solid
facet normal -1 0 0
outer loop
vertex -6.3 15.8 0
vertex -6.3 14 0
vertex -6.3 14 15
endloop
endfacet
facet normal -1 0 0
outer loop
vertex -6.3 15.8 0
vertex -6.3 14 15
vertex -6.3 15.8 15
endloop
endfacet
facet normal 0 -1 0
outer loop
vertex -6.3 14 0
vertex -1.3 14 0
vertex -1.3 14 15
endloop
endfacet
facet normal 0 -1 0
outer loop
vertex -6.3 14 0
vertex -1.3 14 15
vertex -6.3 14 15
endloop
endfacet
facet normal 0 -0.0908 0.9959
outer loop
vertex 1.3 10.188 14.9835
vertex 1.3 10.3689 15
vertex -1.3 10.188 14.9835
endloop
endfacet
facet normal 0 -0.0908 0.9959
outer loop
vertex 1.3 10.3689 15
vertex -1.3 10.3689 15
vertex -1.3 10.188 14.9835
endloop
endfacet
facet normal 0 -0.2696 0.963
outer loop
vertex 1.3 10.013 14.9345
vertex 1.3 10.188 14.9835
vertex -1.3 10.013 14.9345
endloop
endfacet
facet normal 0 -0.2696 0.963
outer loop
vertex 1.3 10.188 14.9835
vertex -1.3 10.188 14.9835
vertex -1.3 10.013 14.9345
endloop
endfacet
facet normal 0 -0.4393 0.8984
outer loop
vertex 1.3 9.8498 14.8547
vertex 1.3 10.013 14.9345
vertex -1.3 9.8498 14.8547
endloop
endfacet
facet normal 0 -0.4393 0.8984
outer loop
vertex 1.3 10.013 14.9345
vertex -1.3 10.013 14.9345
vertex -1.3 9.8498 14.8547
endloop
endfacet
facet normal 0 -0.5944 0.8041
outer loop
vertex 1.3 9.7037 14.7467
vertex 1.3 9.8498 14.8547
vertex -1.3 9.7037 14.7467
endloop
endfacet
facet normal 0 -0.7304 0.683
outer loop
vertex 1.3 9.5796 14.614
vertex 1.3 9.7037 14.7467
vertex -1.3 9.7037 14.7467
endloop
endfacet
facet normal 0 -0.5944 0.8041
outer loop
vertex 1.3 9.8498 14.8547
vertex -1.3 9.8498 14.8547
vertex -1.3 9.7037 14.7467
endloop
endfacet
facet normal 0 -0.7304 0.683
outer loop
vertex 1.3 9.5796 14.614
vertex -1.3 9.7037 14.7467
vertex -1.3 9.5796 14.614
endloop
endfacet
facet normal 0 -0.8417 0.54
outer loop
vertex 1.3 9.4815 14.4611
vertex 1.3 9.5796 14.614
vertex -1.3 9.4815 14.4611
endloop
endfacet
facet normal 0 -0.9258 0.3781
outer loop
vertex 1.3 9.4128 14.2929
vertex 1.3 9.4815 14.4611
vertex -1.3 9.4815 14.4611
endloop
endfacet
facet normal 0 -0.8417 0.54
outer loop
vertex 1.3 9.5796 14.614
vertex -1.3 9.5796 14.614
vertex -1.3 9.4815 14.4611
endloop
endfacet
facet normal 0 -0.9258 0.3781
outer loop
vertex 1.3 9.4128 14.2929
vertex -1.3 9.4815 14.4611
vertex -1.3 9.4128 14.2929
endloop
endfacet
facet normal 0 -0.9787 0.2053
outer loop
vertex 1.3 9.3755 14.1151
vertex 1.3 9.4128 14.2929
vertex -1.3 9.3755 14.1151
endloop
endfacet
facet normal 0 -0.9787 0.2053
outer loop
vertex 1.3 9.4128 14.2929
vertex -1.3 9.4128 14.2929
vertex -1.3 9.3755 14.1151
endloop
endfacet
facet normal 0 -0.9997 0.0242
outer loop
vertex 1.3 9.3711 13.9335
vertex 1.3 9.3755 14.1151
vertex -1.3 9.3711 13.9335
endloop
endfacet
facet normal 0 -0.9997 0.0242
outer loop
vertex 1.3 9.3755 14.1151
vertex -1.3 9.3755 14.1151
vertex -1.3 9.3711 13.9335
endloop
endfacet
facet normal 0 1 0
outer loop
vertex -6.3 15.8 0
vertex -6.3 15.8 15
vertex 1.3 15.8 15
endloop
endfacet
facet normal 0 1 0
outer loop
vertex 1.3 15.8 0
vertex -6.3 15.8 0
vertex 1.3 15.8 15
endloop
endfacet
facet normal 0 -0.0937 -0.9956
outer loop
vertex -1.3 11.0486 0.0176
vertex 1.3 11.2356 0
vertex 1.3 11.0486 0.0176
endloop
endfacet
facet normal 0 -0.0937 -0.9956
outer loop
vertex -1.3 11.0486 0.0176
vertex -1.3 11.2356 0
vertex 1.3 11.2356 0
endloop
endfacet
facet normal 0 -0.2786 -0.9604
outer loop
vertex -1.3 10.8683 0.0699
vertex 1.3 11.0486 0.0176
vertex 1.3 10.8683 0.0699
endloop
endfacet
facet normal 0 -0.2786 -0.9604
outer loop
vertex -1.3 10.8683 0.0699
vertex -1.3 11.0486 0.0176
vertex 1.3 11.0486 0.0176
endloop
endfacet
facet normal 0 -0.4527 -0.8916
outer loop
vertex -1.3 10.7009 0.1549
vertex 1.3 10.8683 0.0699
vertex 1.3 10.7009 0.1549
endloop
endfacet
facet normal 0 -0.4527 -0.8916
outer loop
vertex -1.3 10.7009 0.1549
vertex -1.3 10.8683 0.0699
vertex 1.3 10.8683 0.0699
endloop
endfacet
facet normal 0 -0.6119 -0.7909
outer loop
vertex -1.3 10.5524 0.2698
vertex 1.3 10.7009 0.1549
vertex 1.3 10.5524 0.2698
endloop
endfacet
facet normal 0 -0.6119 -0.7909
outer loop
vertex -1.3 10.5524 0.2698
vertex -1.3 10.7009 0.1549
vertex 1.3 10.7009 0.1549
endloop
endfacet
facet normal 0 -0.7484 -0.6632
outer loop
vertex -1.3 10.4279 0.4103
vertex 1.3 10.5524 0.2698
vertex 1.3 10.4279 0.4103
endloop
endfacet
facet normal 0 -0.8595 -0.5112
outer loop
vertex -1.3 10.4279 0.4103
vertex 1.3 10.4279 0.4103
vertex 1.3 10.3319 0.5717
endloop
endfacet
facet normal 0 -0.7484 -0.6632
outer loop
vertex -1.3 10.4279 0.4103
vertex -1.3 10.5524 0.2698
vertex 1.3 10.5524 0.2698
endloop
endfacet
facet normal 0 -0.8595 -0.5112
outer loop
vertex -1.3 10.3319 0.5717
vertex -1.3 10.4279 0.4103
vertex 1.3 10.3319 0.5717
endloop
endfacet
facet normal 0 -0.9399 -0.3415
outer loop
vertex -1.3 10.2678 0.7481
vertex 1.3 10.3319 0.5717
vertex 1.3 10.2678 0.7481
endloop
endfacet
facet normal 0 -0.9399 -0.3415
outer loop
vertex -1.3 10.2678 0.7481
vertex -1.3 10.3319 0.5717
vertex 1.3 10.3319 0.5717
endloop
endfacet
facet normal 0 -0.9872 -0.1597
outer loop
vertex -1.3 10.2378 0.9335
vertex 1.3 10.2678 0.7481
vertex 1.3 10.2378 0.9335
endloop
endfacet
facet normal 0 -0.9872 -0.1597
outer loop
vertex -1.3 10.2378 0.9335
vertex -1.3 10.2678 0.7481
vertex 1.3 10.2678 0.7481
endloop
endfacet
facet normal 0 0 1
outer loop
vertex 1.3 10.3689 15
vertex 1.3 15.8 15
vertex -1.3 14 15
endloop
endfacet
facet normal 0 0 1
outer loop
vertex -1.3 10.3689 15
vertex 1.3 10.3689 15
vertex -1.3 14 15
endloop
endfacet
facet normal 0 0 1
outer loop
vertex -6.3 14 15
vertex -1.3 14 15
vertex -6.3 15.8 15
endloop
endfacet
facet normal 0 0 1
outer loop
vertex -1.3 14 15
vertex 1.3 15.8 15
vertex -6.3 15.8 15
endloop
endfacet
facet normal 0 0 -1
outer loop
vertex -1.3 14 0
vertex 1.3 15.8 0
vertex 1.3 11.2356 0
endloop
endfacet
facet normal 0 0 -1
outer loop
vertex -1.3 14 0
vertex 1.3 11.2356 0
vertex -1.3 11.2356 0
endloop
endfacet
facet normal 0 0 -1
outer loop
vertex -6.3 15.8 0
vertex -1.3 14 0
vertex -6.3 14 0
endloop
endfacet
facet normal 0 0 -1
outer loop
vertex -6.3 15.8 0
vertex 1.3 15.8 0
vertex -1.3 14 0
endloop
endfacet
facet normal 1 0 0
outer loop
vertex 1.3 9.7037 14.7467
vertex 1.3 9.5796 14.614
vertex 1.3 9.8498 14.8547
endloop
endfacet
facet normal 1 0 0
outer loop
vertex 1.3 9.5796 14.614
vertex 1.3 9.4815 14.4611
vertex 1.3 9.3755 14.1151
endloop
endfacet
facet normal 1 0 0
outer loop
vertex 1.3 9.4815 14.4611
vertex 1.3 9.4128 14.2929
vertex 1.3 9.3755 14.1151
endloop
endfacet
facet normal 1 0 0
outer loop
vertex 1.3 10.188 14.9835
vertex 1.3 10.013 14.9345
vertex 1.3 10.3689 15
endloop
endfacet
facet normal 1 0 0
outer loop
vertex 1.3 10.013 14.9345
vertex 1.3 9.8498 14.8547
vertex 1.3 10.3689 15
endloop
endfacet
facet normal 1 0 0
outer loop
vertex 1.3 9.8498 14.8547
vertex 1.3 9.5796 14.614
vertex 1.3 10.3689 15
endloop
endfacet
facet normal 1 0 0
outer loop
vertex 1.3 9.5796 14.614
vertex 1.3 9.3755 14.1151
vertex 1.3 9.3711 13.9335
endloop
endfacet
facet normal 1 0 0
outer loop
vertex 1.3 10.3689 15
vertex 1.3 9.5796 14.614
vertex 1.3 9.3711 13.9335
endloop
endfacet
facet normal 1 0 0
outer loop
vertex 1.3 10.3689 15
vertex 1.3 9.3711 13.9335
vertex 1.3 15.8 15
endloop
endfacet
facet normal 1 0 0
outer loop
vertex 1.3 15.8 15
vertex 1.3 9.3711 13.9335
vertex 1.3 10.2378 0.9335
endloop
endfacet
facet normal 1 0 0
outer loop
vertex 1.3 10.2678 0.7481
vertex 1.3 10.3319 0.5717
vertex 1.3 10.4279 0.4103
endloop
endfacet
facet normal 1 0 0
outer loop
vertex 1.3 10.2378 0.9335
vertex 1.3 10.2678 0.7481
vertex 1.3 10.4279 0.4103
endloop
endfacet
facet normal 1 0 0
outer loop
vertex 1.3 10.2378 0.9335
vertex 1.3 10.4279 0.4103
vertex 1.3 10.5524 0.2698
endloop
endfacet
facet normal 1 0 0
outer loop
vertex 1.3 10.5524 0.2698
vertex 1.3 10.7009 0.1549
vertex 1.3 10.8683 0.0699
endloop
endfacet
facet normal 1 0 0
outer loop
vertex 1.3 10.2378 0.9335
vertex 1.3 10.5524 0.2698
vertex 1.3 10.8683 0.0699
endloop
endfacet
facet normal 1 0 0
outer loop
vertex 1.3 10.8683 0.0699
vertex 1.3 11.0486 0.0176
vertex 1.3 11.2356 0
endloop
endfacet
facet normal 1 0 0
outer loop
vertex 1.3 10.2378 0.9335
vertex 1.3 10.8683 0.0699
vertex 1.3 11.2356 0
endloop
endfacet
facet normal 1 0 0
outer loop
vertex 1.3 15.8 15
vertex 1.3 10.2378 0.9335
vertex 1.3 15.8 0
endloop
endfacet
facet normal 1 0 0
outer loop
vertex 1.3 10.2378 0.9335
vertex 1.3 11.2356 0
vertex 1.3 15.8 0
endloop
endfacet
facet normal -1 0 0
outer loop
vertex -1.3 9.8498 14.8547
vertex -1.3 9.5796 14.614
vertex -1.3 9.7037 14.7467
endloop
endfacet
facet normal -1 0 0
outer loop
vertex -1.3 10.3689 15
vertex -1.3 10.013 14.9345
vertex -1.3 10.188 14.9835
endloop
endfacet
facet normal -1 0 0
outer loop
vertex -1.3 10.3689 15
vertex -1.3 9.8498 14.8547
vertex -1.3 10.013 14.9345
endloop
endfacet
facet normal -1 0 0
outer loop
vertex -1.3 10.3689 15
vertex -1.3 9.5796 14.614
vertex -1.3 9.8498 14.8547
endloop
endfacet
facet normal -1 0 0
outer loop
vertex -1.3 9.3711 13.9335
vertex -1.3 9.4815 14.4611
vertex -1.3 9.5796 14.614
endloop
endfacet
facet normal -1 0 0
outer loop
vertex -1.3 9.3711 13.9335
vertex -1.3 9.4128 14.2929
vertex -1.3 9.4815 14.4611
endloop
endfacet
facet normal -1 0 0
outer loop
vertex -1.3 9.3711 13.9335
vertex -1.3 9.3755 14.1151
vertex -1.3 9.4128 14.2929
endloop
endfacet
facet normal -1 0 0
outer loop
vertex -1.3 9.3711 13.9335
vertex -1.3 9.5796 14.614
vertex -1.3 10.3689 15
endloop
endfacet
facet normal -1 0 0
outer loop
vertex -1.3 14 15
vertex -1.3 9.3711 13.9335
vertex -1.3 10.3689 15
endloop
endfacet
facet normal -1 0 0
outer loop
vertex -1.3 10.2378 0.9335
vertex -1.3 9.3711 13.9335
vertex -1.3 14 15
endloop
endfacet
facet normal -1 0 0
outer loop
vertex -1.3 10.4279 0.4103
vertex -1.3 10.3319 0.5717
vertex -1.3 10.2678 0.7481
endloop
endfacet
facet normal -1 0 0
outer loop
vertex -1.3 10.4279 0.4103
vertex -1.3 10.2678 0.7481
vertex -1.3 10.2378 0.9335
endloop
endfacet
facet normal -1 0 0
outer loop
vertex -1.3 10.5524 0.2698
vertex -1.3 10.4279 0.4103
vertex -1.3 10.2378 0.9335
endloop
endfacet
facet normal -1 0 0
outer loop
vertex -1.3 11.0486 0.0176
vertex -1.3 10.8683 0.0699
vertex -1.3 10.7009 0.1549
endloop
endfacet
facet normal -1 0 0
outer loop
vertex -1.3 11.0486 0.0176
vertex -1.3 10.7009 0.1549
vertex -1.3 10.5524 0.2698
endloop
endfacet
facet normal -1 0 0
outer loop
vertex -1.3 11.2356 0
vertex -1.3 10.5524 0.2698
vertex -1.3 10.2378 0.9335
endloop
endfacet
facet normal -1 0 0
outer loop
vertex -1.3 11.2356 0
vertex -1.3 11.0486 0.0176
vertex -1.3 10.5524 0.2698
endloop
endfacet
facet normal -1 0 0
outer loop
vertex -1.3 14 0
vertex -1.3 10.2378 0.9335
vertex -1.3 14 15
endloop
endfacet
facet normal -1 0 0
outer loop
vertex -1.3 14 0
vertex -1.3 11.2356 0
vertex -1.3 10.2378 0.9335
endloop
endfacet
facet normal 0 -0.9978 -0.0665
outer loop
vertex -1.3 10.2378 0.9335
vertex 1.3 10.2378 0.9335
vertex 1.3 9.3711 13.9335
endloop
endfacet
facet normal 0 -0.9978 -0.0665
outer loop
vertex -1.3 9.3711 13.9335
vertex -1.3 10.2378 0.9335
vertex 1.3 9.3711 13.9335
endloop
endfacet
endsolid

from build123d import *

# Parameters (mm, degrees)
BOSS_EXTRUDE1_DEPTH = 15
CUT_EXTRUDE1_DEPTH  = 15
FILLET1_R           = 1


with BuildPart() as part:
    # Sketch1 → Boss-Extrude1 (new body)
    with BuildSketch(Plane.XY):
        Polygon((-6.3, 15.8), (1.3, 15.8), (1.3, 13.8), (1.3, 8.2), (-1.3, 8.2), (-1.3, 14), (-6.3, 14), align=None)
    extrude(amount=BOSS_EXTRUDE1_DEPTH)

    # Sketch3 → Cut-Extrude1 (cut)
    with BuildSketch(Plane(origin=(1.3, 0, 0), x_dir=(0, 0, -1), z_dir=(1, 0, 0))):
        Polygon((-15, 9.3), (-15.890506456, 6.842306326), (2.099726504, 7.064407967), (0, 10.3), align=None)
    extrude(amount=-CUT_EXTRUDE1_DEPTH, mode=Mode.SUBTRACT)

    # Fillet1
    fillet1_edges = [part.edges().sort_by_distance(p)[0] for p in [
        (0, 10.3, 0),
        (0, 9.3, 15),
    ]]
    fillet(fillet1_edges, radius=FILLET1_R)


solid = part.part
